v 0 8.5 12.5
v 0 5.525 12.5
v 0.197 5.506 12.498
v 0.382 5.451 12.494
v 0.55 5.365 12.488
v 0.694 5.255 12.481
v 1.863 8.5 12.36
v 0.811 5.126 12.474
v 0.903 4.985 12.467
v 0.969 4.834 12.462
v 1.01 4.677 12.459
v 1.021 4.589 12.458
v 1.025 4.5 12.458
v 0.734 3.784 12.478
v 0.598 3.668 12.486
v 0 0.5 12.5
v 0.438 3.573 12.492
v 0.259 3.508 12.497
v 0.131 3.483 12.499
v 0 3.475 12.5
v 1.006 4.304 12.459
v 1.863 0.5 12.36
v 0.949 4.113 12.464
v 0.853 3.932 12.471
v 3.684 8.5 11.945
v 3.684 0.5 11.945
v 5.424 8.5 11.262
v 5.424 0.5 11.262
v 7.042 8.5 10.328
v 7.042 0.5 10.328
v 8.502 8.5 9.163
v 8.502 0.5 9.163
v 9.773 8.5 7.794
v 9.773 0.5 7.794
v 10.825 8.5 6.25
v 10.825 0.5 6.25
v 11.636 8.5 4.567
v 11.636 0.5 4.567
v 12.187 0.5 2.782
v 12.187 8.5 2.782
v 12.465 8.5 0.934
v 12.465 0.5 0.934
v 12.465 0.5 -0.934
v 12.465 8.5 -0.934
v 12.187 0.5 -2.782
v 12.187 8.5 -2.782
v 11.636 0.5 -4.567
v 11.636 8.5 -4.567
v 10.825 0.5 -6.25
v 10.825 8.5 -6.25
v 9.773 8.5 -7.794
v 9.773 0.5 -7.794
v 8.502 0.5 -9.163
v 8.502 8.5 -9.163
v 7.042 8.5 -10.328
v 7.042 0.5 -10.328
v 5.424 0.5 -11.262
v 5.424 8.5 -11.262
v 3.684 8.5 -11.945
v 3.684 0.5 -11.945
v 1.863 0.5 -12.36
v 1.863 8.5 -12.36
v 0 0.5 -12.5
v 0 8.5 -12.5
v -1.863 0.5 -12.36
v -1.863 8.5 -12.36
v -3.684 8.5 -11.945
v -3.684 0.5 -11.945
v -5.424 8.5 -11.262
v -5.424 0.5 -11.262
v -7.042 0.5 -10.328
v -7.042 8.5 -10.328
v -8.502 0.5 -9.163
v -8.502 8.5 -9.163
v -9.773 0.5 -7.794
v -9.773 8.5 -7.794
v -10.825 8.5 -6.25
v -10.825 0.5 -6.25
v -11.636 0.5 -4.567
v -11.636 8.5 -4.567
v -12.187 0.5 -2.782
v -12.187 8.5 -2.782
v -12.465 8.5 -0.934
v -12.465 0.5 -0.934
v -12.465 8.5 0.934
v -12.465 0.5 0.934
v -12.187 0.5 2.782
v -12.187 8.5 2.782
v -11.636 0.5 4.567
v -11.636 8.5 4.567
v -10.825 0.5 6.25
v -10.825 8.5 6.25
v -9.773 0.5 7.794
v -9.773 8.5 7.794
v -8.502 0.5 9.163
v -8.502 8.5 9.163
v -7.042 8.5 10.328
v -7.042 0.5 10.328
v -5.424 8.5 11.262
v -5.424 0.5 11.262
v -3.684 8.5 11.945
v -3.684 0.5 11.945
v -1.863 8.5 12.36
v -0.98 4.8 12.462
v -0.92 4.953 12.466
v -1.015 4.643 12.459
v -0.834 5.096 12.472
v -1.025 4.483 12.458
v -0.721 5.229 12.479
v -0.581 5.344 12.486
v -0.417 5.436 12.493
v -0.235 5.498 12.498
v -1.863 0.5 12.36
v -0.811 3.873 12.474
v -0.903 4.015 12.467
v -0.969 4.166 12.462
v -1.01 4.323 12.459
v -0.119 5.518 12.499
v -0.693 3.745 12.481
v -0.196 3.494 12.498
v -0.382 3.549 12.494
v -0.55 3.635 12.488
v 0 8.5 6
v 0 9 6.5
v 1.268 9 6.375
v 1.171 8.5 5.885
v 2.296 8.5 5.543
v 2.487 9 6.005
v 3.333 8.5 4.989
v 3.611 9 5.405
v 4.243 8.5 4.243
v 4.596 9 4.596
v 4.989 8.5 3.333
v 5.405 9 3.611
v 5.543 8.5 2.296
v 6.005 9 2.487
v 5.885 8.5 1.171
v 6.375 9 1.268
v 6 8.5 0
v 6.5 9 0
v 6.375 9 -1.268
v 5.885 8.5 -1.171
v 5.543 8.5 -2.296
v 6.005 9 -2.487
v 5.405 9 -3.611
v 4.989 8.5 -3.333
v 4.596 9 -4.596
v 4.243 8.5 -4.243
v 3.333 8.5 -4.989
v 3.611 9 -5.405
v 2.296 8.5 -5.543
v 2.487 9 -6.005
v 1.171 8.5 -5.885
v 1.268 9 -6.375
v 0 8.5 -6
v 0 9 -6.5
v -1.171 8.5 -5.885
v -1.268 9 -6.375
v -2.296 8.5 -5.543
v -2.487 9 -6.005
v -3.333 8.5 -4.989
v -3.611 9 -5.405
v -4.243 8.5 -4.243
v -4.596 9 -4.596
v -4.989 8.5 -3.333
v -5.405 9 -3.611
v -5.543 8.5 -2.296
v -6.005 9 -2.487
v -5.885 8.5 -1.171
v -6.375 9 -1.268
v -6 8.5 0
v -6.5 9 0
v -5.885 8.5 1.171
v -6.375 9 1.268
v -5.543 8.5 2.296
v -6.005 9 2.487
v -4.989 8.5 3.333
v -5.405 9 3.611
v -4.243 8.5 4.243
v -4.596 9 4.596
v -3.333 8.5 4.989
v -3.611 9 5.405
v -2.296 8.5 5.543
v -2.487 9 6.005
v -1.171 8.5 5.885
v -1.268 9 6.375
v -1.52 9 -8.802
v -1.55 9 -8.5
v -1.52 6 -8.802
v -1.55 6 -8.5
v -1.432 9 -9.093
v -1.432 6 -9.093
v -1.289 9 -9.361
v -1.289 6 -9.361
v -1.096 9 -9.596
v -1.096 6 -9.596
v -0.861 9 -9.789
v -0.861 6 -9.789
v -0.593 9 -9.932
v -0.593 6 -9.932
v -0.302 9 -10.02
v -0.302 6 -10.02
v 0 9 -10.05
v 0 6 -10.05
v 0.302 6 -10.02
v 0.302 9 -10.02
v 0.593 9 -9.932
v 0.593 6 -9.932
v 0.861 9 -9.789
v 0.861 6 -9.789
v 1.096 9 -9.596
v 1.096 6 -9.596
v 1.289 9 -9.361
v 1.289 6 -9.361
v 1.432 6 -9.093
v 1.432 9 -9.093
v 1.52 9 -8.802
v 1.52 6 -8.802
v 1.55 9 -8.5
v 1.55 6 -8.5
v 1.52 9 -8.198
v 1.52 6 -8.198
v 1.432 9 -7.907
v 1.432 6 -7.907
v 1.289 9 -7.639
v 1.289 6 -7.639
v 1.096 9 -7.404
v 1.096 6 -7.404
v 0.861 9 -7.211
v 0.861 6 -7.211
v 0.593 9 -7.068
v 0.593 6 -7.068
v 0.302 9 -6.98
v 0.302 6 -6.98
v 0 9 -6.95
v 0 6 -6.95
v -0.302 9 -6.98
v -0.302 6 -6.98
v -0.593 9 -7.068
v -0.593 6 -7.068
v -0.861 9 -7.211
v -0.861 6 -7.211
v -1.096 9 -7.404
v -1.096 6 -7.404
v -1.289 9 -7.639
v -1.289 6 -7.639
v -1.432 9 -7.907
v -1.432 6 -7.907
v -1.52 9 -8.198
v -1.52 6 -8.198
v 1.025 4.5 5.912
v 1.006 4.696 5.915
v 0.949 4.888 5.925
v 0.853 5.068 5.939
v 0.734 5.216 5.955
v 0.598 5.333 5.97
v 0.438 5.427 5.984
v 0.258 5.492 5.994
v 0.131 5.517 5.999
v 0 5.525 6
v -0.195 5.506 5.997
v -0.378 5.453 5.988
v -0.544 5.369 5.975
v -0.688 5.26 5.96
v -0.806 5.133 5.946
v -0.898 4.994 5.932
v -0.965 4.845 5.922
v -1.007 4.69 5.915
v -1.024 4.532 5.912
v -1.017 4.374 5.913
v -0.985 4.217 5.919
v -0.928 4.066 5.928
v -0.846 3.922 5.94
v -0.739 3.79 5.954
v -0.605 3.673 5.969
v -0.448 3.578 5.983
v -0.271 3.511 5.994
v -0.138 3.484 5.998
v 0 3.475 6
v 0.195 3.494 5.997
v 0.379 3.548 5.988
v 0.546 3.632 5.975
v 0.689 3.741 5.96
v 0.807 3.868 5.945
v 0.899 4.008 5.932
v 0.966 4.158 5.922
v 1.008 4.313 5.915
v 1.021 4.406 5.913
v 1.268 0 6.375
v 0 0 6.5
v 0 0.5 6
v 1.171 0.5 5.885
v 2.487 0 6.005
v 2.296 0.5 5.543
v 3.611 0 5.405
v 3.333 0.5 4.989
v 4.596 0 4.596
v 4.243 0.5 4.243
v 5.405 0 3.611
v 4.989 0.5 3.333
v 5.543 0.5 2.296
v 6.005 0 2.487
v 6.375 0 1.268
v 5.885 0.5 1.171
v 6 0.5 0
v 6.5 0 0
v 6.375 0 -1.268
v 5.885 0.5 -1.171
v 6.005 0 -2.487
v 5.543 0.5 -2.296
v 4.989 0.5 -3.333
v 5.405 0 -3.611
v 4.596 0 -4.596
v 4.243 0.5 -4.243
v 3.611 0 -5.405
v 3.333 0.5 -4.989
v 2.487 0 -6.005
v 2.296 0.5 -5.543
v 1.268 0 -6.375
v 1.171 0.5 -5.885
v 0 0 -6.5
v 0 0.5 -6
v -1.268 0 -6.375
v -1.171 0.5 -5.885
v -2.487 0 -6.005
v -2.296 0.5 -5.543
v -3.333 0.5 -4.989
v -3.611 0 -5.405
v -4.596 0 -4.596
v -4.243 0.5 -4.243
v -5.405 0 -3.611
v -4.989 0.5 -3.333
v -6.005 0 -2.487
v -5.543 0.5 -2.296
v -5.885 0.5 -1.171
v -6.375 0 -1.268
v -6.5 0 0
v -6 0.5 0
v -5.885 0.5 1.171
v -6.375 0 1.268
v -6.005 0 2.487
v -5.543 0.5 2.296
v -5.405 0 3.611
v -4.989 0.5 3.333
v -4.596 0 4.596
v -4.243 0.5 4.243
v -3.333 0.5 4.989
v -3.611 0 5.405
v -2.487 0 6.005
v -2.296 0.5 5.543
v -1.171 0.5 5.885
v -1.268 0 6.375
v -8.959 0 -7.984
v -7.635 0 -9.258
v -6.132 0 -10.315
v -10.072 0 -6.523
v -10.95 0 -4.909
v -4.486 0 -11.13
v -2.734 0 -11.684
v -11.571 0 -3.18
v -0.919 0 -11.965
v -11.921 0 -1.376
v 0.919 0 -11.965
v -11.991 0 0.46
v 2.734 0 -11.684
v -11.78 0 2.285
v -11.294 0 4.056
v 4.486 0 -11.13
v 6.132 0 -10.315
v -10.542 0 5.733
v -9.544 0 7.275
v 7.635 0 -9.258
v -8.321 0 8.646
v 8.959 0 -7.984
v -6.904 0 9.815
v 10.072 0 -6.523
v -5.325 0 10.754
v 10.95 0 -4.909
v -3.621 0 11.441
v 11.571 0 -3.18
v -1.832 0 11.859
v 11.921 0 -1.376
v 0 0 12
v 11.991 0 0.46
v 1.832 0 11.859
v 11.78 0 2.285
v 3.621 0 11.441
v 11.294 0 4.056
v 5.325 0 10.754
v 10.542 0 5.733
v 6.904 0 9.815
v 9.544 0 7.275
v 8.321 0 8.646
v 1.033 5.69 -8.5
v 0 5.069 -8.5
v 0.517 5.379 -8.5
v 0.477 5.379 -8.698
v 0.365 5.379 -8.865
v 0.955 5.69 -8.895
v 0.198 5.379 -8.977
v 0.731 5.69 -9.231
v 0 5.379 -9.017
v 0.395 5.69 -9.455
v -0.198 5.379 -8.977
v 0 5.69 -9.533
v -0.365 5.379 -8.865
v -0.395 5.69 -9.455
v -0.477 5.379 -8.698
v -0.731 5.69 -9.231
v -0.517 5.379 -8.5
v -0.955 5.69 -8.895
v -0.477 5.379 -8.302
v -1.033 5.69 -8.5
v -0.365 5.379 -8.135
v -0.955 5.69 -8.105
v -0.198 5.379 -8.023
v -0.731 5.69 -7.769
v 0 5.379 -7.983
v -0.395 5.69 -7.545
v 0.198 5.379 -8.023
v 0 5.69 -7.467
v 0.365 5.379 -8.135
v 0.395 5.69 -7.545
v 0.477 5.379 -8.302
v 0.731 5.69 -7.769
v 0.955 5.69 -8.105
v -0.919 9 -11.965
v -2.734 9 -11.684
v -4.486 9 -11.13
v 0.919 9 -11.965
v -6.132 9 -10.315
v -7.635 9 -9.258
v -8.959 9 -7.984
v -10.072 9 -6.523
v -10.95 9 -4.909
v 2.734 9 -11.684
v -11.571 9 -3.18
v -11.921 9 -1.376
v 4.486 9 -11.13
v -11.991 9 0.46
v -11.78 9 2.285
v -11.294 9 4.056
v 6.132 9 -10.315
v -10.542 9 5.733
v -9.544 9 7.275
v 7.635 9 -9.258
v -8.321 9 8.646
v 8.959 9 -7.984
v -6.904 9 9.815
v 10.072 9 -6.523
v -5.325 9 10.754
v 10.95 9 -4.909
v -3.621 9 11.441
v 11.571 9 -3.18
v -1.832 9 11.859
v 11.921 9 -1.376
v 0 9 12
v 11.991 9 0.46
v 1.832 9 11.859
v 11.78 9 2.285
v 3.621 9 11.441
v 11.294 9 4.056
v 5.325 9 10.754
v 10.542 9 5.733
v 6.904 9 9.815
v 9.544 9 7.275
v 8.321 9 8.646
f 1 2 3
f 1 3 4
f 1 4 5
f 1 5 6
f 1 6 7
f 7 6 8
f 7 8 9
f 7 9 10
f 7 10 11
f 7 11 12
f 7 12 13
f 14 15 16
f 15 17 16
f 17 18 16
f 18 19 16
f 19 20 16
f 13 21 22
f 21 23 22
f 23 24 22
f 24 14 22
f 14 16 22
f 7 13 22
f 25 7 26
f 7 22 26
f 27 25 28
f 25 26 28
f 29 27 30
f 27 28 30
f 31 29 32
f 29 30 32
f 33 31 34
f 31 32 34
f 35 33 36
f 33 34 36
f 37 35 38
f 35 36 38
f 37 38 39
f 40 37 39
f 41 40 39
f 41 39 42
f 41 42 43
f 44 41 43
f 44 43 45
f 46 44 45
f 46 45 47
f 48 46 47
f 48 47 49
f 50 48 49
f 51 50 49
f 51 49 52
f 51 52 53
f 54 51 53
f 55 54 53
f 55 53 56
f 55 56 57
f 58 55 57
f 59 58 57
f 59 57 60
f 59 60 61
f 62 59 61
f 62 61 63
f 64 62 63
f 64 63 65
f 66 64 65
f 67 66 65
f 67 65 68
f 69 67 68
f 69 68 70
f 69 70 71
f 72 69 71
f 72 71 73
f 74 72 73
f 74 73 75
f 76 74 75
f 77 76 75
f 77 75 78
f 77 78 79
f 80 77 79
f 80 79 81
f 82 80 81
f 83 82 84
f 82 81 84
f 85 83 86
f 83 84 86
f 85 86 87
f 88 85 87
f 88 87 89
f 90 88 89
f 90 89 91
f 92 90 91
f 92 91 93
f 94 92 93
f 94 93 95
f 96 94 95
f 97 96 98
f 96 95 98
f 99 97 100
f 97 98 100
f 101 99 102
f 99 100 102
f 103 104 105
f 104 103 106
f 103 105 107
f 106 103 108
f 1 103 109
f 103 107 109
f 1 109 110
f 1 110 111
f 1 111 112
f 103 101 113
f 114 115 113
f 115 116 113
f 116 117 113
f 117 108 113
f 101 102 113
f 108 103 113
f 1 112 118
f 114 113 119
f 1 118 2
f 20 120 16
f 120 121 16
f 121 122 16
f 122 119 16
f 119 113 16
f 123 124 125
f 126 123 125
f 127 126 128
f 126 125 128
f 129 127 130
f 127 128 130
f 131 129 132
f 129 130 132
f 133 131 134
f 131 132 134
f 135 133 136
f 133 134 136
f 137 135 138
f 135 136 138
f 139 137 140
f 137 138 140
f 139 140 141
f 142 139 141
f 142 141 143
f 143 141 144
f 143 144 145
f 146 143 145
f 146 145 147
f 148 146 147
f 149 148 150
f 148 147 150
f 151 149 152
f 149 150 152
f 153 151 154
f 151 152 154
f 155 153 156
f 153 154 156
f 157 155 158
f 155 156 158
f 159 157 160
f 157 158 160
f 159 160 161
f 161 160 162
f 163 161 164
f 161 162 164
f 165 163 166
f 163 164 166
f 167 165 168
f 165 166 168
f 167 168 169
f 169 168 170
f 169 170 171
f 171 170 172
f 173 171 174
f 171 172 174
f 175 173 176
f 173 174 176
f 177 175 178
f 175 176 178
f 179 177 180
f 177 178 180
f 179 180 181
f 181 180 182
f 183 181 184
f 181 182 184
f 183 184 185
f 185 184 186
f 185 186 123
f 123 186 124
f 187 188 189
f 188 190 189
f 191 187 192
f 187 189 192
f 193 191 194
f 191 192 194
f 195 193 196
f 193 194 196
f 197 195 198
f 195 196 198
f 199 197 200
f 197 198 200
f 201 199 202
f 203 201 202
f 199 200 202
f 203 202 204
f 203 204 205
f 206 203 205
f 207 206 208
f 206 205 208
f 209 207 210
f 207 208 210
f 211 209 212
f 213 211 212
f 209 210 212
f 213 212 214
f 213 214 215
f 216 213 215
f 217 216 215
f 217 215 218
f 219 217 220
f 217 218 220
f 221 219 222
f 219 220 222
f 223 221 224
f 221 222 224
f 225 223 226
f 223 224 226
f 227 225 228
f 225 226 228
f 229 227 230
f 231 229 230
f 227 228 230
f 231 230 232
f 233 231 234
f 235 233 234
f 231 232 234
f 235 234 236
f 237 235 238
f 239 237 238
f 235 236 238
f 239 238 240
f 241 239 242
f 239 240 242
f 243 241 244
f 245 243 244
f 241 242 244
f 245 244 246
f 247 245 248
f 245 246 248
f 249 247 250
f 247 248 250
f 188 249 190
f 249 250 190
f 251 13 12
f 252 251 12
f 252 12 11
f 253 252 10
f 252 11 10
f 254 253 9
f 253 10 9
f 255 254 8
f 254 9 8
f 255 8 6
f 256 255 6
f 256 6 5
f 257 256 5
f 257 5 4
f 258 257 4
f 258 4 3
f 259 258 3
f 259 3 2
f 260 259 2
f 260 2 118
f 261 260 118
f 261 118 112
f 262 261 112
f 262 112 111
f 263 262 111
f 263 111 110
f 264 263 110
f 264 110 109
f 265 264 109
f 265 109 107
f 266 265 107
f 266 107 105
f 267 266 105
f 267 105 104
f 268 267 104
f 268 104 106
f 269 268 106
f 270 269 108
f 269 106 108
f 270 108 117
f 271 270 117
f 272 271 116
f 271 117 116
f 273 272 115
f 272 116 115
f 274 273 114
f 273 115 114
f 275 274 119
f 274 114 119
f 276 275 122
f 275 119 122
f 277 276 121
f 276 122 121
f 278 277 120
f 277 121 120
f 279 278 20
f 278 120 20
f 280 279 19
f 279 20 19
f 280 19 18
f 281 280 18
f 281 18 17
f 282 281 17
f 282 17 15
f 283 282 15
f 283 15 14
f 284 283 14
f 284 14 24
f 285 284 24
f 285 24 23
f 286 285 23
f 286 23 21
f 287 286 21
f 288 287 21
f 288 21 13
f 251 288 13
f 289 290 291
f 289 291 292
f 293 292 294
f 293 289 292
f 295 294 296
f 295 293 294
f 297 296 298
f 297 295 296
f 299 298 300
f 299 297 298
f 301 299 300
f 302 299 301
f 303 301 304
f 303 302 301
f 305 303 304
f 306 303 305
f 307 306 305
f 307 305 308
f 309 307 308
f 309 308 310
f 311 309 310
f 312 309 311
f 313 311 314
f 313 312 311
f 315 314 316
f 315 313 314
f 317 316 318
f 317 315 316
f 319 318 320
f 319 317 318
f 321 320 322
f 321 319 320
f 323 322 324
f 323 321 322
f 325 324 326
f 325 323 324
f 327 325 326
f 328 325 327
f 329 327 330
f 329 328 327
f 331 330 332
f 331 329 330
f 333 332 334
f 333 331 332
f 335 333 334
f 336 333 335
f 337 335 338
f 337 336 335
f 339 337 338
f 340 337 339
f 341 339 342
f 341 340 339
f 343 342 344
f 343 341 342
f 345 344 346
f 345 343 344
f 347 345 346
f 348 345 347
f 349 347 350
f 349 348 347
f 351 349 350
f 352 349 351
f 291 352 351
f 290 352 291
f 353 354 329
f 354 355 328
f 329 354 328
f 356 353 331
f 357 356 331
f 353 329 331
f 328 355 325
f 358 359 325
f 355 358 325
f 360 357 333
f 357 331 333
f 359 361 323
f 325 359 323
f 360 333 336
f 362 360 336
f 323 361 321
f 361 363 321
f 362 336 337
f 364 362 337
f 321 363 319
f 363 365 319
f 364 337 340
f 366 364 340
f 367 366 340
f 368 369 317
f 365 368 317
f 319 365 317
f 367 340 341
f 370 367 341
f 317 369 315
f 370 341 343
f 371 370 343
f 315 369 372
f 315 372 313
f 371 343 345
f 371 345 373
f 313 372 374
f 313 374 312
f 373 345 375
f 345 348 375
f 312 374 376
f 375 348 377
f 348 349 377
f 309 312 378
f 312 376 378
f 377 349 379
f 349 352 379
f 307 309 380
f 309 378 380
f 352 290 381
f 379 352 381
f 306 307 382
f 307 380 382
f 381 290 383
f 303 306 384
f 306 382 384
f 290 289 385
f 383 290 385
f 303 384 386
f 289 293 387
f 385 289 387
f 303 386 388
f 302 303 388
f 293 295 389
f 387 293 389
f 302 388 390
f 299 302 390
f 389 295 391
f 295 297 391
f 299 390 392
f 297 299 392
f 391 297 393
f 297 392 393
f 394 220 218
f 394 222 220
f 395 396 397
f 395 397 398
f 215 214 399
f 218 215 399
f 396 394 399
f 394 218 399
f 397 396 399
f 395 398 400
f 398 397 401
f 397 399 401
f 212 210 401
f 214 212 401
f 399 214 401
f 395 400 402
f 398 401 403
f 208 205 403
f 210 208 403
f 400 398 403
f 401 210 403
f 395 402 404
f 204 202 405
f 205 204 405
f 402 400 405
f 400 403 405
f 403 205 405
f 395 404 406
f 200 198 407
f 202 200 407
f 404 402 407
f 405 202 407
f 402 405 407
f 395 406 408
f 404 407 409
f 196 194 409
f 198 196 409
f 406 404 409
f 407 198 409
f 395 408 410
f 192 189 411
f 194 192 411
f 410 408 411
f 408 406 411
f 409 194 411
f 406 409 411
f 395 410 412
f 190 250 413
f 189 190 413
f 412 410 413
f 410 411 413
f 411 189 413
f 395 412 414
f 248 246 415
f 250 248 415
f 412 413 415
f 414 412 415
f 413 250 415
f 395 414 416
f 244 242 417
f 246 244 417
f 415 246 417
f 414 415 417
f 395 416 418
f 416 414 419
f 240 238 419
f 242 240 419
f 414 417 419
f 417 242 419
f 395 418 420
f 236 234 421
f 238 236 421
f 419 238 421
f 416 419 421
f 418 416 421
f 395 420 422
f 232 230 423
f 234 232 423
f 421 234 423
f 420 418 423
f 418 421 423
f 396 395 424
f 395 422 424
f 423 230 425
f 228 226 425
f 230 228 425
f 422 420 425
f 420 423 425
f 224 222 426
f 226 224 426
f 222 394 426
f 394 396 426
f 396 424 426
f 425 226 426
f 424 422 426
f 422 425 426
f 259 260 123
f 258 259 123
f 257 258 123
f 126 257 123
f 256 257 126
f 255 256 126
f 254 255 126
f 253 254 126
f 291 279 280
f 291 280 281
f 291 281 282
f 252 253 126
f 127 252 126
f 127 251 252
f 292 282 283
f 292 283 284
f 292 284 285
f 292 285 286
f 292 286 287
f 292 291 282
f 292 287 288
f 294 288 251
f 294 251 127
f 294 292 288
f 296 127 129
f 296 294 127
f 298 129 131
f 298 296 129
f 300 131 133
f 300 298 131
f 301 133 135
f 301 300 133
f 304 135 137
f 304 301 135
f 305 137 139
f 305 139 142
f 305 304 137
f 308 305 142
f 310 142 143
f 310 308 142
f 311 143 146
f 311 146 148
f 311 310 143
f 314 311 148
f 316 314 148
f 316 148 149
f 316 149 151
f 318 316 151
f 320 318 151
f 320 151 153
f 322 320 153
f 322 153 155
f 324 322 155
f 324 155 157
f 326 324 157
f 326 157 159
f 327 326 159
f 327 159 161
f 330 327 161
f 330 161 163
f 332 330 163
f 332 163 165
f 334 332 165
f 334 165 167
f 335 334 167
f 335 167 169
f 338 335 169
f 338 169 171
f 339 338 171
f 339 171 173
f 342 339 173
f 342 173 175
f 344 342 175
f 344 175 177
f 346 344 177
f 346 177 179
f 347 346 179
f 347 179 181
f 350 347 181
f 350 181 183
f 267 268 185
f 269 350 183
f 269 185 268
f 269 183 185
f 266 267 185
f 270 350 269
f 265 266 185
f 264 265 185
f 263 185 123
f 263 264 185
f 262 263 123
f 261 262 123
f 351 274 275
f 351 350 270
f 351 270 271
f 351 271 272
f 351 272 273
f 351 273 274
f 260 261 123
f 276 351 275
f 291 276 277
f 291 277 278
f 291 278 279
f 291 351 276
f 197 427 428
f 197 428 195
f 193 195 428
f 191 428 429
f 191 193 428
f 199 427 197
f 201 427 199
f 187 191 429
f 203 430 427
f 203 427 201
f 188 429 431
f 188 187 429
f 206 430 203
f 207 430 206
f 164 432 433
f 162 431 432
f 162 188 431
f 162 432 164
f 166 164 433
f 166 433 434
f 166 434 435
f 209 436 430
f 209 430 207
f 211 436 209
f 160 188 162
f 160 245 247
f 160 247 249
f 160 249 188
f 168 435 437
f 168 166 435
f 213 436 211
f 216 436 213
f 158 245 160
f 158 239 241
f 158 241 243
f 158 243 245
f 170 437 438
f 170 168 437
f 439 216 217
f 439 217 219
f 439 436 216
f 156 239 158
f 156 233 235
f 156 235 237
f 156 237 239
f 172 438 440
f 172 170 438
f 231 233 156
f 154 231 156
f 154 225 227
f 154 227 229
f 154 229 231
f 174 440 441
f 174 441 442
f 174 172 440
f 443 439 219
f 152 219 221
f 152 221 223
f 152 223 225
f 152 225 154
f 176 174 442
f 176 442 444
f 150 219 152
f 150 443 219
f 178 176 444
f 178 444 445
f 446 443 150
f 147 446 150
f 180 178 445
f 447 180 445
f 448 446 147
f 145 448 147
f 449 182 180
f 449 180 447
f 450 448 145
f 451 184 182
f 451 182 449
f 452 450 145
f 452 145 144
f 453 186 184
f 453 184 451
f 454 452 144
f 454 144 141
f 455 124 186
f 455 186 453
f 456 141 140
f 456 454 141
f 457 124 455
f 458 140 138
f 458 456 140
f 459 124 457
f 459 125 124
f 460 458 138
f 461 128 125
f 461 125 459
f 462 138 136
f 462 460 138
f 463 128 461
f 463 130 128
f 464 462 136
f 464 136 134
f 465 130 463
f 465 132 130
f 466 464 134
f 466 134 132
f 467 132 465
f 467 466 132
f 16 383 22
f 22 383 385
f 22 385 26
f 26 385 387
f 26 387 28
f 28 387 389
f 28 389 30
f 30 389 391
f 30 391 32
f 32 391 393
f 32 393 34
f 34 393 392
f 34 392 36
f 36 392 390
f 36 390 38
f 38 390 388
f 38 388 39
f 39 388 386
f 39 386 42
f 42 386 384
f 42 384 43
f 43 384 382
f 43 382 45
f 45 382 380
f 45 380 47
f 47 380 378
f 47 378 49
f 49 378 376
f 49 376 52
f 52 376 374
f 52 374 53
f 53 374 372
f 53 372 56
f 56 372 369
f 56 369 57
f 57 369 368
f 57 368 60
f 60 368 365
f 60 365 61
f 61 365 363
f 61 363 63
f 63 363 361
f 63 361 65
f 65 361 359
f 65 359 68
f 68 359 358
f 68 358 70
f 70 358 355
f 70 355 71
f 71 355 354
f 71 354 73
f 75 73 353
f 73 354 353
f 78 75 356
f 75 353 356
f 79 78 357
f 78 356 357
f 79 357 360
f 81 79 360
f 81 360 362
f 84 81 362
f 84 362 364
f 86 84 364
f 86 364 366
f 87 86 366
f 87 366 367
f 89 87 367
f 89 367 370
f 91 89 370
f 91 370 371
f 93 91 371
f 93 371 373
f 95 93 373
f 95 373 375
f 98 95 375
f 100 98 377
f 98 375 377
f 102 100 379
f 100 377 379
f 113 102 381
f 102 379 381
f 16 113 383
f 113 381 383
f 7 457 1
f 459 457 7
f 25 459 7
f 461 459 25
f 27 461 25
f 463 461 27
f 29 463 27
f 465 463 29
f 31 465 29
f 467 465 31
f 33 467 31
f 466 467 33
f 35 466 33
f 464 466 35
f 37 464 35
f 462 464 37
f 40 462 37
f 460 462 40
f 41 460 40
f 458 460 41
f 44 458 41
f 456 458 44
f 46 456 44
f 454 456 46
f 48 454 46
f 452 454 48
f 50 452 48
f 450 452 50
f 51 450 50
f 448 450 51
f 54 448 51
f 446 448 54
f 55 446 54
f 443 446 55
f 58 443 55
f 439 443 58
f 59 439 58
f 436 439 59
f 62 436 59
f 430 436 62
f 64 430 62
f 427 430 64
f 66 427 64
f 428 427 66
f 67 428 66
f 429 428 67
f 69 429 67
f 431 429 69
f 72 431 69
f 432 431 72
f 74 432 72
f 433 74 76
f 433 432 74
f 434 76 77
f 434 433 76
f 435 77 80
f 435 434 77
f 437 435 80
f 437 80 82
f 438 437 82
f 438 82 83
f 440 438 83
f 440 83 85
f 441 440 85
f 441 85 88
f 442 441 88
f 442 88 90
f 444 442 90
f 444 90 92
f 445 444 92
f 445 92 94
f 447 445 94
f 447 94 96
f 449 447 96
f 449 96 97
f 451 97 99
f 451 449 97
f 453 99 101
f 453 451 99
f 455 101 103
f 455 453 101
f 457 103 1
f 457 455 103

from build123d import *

# Parameters (mm, degrees)
SKETCH1_R                      = 12.5
SKETCH1_R_2                    = 6
BOSS_EXTRUDE1_DEPTH            = 9
CHAMFER1_SIZE                  = 0.5
M2_5X0_45_TAPPED_HOLE1_REACH   = 31.364
M2_5X0_45_TAPPED_HOLE1_BORE_R  = 1.025
F_3_1_3_1_DIAMETER_HOLE1_D     = 3.1
F_3_1_3_1_DIAMETER_HOLE1_DEPTH = 3
F_3_1_3_1_DIAMETER_HOLE1_TIP   = 0.931333959


with BuildPart() as part:
    # Sketch1 → Boss-Extrude1 (new body)
    with BuildSketch(Plane(origin=(0, 0, 0), x_dir=(1, 0, 0), z_dir=(0, 1, 0))):
        with Locations(Location((0, 0, 0), (0, 0, 270))):
            Circle(SKETCH1_R)
        with Locations(Location((0, 0, 0), (0, 0, 270))):
            Circle(SKETCH1_R_2, mode=Mode.SUBTRACT)
    extrude(amount=BOSS_EXTRUDE1_DEPTH)

    # Chamfer1
    chamfer1_edges = [part.edges().sort_by_distance(p)[0] for p in [
        (0, 0, -12.5),
        (0, 9, -12.5),
        (0, 0, -6),
        (0, 9, -6),
    ]]
    chamfer(chamfer1_edges, length=CHAMFER1_SIZE)

    # M2.5x0.45 Tapped Hole1 bore → M2.5x0.45 Tapped Hole1 (cut, up to next)
    with BuildSketch(Plane.XY.offset(12.5), mode=Mode.PRIVATE) as m2_5x0_45_tapped_hole1_sk1:
        with Locations((0, 4.5)):
            Circle(M2_5X0_45_TAPPED_HOLE1_BORE_R)
    m2_5x0_45_tapped_hole1_tool1 = extrude(m2_5x0_45_tapped_hole1_sk1.sketch, amount=-M2_5X0_45_TAPPED_HOLE1_REACH, mode=Mode.PRIVATE) & part.part
    add(m2_5x0_45_tapped_hole1_tool1.solids().sort_by_distance((0, 4.5, 12.5))[0], mode=Mode.SUBTRACT)

    # Ø3.1 (3.1) Diameter Hole1
    with Locations(Plane(origin=(0, 9, 0), x_dir=(1, 0, 0), z_dir=(0, 1, 0))):
        with Locations((0, 8.5)):
            Hole(F_3_1_3_1_DIAMETER_HOLE1_D / 2, depth=F_3_1_3_1_DIAMETER_HOLE1_DEPTH)
            with Locations((0, 0, -(F_3_1_3_1_DIAMETER_HOLE1_DEPTH + F_3_1_3_1_DIAMETER_HOLE1_TIP / 2))):  # 118° drill point
                Cone(0, F_3_1_3_1_DIAMETER_HOLE1_D / 2, F_3_1_3_1_DIAMETER_HOLE1_TIP, mode=Mode.SUBTRACT)


solid = part.part
